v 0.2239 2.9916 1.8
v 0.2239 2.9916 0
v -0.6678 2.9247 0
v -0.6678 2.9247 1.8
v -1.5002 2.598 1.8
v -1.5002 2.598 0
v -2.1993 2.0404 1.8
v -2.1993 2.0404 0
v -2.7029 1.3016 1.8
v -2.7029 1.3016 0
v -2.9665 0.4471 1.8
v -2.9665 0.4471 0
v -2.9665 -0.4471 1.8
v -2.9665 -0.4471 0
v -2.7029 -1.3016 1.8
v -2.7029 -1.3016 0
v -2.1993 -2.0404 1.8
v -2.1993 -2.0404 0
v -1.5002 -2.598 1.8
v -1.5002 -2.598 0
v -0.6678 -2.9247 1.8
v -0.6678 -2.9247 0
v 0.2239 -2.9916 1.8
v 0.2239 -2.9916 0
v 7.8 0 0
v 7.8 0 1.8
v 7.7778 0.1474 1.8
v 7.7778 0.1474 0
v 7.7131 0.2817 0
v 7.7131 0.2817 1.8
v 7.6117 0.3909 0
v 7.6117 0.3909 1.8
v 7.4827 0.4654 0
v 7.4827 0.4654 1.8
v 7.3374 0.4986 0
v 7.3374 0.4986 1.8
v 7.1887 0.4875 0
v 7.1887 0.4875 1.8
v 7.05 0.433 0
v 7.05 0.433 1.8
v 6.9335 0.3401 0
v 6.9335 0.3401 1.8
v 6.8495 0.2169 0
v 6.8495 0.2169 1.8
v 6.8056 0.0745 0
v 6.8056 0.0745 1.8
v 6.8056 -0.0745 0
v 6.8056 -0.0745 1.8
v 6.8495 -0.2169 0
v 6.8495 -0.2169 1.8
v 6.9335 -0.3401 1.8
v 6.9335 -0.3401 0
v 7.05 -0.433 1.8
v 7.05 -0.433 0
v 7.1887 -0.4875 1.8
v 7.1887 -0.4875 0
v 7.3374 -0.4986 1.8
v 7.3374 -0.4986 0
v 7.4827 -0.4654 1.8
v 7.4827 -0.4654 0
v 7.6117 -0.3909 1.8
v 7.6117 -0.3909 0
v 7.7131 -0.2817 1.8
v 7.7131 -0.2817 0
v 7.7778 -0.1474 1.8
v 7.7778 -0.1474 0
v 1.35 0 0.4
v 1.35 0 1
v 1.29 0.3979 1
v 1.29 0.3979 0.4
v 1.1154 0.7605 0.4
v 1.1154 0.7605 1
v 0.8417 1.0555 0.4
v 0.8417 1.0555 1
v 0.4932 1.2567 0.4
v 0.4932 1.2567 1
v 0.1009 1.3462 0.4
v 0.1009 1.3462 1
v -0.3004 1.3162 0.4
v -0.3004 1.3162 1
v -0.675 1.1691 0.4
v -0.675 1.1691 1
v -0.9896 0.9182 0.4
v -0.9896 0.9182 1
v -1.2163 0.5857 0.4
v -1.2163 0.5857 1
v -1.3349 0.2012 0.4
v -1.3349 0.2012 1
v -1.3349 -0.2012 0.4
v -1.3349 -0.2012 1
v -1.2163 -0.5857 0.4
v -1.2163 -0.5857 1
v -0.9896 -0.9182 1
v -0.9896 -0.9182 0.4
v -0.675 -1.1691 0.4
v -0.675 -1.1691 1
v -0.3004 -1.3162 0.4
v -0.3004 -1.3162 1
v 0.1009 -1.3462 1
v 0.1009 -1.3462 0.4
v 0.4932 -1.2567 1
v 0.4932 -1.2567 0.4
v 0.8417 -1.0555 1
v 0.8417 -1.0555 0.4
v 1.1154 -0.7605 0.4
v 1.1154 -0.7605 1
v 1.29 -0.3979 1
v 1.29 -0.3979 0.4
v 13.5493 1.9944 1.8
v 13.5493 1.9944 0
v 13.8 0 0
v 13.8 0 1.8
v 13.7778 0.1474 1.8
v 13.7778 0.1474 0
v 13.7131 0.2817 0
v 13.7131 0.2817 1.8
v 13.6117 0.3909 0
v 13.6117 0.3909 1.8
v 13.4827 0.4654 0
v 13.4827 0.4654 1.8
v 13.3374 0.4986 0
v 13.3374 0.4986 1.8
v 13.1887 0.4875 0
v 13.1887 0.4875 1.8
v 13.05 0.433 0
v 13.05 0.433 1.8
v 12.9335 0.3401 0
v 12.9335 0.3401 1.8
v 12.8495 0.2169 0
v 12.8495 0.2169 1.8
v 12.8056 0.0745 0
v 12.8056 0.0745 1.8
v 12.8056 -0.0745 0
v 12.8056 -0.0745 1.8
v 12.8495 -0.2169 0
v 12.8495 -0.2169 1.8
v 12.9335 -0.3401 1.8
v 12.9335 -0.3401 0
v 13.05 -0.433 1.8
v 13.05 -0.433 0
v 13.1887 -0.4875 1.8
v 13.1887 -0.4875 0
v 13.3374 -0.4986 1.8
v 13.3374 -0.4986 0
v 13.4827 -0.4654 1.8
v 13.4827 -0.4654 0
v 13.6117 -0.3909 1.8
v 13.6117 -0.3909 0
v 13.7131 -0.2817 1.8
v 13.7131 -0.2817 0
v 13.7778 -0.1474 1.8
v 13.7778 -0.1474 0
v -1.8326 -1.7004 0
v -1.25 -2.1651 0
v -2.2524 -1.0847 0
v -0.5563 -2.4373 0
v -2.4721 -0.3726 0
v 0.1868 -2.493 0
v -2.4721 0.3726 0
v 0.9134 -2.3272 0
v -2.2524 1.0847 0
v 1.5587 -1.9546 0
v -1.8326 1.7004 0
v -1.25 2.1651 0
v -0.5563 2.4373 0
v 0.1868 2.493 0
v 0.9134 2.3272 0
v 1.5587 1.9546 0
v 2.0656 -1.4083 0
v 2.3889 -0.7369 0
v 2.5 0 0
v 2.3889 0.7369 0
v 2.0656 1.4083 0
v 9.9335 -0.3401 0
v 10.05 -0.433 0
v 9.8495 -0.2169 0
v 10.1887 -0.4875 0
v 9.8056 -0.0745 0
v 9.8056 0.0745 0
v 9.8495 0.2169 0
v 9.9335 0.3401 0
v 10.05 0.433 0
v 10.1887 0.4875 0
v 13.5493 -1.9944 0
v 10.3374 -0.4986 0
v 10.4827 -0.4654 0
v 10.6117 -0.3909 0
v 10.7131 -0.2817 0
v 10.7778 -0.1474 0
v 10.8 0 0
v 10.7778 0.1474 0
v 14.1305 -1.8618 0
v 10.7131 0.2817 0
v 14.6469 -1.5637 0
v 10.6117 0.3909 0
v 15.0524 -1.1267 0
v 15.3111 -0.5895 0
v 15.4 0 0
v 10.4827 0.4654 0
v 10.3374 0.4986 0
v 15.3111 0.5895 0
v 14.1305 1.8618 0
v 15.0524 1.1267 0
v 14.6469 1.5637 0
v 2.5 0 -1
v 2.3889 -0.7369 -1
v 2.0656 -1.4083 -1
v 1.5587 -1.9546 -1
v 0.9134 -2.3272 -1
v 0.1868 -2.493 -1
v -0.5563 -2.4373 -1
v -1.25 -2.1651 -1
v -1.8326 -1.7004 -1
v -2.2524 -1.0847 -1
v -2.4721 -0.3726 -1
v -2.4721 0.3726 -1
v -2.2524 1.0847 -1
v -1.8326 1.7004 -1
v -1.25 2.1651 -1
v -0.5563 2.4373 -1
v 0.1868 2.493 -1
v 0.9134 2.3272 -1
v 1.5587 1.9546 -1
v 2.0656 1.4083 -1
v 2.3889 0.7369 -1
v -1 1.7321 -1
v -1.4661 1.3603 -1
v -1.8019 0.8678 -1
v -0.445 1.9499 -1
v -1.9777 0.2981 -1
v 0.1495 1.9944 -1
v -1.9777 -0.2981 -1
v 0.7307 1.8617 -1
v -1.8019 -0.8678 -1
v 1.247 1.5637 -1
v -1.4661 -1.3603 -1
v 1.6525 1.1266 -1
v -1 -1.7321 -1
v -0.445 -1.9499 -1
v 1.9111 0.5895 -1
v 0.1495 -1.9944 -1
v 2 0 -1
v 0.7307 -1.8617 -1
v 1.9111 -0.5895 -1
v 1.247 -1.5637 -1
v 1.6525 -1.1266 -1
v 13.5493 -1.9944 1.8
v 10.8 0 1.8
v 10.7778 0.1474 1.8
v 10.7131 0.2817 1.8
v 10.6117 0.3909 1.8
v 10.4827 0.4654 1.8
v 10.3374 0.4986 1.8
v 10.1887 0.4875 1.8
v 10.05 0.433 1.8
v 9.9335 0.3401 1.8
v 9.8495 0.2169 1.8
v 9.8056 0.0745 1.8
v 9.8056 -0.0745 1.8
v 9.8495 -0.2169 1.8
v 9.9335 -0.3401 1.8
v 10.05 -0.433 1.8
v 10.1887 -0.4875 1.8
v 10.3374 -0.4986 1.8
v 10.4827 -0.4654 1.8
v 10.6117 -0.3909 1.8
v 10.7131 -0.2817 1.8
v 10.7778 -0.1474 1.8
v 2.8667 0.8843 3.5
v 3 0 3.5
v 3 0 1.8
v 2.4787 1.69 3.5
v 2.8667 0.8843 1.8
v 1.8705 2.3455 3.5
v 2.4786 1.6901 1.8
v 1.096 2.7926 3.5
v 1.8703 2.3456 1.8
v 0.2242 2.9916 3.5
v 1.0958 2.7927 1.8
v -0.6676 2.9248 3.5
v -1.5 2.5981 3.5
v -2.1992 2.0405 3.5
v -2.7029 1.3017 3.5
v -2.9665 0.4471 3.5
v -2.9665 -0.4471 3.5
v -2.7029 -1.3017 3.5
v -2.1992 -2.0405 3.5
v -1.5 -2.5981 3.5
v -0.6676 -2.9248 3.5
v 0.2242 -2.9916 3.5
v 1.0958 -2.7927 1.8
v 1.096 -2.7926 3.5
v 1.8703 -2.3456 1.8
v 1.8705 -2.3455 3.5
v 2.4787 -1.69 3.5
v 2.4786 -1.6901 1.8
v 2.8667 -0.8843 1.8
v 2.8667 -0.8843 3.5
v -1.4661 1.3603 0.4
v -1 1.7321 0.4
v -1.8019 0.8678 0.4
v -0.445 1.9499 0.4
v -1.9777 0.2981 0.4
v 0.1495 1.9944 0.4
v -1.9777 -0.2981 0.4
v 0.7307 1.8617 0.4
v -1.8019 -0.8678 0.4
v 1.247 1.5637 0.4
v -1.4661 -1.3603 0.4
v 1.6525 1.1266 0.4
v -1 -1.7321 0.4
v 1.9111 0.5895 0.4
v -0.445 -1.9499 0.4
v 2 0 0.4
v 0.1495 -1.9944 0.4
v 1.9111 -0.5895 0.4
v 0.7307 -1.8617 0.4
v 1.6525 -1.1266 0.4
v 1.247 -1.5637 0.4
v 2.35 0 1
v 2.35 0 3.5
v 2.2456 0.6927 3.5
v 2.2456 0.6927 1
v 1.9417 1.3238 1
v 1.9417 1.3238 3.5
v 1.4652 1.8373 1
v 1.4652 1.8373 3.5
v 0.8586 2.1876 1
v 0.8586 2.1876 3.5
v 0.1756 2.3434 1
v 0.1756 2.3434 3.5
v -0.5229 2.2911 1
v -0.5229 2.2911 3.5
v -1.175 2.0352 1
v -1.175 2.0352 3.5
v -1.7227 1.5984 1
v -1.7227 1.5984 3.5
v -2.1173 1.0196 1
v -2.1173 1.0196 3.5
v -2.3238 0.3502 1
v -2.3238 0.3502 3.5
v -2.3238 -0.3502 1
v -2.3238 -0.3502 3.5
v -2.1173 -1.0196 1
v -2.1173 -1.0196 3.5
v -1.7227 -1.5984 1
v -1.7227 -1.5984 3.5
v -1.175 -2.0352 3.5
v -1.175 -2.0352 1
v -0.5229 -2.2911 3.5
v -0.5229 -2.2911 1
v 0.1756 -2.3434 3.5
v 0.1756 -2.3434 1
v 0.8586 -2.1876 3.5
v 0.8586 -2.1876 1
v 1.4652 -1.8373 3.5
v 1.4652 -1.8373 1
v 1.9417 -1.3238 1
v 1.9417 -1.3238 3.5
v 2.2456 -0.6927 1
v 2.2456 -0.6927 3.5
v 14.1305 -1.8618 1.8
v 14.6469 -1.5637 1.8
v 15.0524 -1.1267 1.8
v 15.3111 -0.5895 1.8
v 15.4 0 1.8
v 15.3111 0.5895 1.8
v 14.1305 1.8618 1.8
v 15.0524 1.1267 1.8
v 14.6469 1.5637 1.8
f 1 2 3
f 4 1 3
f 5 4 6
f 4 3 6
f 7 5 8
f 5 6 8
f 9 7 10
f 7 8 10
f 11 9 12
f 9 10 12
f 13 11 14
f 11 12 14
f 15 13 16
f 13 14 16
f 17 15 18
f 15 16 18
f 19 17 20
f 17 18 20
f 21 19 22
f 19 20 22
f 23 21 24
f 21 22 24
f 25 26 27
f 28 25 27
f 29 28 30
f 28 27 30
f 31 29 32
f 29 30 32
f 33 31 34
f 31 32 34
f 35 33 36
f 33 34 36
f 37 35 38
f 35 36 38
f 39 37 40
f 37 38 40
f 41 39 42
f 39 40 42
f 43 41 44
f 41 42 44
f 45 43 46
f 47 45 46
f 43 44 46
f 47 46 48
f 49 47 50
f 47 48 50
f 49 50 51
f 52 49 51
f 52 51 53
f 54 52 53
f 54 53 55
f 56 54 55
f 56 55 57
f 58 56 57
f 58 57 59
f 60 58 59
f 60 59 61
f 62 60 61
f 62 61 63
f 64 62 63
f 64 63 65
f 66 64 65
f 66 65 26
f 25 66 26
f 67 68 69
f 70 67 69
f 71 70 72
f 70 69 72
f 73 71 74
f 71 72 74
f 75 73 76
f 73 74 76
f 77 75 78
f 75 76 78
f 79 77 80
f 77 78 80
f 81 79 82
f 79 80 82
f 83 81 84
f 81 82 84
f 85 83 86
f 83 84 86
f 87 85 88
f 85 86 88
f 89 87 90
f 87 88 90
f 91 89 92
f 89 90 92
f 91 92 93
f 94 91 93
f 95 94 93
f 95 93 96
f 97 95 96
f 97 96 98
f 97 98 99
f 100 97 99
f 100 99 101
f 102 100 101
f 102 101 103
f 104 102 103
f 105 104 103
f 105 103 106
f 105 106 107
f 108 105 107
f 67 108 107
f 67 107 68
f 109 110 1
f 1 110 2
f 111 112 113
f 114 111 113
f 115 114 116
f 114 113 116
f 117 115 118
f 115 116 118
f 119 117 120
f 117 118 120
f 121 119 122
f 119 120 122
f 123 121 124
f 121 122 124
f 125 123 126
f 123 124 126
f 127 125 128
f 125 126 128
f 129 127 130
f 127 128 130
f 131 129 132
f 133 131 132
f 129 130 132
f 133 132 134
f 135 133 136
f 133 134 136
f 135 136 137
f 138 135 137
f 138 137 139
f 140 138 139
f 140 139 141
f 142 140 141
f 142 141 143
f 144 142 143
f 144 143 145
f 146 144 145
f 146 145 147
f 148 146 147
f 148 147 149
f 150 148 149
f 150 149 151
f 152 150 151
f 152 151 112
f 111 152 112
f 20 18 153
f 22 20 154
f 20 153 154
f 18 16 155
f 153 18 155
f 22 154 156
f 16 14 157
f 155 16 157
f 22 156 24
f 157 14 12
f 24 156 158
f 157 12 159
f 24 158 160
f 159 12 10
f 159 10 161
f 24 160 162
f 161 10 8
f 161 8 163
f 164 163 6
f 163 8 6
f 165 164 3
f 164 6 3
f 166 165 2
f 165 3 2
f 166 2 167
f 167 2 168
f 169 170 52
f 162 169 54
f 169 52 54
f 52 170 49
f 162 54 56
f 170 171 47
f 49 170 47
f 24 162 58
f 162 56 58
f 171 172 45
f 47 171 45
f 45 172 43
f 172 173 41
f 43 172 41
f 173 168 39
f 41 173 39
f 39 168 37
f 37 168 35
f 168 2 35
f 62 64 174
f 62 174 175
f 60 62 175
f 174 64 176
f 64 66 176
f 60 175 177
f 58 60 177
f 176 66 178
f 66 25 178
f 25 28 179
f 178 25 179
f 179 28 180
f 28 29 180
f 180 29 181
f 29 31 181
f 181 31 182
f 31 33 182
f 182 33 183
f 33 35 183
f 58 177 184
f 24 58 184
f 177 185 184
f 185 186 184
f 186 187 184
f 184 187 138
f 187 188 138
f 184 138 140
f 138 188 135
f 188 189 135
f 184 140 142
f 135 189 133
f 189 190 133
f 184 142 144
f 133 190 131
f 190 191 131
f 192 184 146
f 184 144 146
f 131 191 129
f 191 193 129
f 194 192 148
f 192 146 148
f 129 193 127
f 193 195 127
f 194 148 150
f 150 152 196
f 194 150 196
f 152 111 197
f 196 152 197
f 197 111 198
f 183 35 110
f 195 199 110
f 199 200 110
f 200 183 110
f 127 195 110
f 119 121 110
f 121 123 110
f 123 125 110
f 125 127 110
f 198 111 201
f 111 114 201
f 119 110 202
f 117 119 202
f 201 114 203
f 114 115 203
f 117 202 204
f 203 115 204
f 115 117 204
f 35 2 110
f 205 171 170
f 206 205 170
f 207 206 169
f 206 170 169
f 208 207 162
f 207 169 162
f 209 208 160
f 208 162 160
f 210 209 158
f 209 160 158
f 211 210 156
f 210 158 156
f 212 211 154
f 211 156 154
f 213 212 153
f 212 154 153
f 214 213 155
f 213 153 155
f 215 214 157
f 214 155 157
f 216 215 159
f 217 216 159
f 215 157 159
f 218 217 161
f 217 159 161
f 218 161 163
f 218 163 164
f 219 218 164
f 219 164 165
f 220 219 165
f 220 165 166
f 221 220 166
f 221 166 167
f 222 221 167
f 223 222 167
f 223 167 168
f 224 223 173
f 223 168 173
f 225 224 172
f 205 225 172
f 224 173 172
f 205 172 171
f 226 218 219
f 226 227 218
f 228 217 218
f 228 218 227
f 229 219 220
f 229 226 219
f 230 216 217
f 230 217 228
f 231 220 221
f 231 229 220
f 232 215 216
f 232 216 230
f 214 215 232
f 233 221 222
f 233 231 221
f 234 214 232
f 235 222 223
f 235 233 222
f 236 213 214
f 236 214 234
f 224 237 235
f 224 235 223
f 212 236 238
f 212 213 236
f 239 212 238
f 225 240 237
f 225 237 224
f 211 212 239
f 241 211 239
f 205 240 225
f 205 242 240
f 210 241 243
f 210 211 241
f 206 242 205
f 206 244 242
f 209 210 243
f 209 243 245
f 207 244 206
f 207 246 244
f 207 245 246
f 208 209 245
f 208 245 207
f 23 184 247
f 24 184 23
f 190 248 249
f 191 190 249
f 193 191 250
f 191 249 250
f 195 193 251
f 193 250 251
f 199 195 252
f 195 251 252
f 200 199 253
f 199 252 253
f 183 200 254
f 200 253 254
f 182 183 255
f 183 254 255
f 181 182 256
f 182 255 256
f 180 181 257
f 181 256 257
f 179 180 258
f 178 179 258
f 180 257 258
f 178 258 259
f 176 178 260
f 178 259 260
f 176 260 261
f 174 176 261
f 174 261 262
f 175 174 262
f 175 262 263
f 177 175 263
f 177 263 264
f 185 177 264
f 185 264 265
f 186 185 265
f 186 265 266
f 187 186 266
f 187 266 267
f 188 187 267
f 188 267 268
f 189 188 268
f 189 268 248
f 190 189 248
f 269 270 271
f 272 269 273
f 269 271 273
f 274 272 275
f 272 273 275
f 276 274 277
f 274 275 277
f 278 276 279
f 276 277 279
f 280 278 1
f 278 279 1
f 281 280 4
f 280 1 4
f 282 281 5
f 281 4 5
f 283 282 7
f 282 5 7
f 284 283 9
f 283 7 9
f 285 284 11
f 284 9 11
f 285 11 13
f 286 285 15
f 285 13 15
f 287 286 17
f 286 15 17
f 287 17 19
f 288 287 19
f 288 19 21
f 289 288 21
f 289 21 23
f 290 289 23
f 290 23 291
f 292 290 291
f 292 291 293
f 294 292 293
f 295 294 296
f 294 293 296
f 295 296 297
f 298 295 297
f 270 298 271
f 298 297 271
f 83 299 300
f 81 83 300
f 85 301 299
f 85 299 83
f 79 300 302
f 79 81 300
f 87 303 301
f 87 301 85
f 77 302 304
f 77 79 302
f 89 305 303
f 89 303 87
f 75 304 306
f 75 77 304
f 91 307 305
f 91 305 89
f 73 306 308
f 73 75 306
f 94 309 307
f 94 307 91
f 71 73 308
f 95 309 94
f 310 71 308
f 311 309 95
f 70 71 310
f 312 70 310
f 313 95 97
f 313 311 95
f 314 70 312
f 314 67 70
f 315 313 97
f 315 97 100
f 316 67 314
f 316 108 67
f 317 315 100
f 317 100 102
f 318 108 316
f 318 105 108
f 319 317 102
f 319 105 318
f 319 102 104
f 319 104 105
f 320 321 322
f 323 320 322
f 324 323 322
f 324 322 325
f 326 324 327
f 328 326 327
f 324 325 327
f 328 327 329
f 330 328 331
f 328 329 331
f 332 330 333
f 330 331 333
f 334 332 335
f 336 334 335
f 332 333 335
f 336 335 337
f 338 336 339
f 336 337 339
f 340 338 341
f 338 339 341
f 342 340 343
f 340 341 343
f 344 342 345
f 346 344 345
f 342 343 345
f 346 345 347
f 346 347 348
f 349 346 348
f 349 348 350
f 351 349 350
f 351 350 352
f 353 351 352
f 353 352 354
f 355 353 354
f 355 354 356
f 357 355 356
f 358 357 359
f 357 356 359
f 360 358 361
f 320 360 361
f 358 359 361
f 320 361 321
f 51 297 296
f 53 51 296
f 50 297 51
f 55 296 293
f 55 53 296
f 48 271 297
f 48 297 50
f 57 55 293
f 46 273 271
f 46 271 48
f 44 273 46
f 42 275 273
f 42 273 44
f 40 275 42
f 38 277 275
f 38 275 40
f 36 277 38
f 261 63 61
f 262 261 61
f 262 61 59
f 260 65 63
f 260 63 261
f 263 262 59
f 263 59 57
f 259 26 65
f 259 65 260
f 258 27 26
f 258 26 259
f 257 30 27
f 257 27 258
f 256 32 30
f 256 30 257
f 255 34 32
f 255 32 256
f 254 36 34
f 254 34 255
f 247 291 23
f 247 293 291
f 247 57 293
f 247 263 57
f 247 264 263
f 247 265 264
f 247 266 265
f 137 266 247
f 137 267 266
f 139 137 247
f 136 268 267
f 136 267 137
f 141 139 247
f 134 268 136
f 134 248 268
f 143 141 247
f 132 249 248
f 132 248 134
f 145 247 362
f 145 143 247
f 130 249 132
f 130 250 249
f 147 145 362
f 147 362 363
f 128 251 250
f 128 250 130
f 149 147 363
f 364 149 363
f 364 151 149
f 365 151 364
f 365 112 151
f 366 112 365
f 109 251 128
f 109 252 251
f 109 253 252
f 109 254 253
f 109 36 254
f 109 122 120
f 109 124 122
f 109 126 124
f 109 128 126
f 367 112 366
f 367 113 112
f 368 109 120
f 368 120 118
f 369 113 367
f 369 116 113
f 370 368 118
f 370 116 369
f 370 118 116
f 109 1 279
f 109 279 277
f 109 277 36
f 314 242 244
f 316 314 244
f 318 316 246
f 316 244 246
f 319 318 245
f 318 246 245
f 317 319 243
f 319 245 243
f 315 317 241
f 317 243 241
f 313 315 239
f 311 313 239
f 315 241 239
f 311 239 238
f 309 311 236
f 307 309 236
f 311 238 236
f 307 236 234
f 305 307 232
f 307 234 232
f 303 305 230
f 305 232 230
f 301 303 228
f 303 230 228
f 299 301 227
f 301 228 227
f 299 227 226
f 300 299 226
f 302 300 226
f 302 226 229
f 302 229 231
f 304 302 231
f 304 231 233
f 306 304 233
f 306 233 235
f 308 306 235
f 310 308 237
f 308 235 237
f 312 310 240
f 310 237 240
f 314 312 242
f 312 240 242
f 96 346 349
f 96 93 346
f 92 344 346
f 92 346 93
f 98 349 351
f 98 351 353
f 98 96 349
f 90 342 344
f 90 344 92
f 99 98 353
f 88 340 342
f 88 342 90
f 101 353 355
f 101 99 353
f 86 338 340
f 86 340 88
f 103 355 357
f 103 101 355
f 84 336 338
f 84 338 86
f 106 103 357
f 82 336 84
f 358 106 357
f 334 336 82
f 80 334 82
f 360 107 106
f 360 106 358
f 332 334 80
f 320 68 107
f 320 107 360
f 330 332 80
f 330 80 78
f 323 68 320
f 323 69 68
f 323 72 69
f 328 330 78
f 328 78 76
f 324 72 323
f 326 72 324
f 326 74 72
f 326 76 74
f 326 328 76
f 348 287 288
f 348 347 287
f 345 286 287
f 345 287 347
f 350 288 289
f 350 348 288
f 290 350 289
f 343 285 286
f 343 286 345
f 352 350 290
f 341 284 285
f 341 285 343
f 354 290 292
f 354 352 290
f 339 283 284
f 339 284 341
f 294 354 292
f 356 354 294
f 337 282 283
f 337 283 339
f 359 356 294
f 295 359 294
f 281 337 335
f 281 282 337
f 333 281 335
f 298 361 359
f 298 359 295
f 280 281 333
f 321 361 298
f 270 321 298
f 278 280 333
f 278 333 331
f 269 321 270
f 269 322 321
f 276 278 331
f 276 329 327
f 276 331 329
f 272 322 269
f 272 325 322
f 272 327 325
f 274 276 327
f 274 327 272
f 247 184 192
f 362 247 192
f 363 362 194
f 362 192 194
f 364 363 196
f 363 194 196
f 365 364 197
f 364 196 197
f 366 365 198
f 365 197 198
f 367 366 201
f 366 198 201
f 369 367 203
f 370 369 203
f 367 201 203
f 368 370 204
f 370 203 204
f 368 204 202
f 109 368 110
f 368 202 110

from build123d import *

# Parameters (mm, degrees)
PAD_DEPTH       = 1.8
SKETCH001_R     = 3
PAD001_DEPTH    = 1.7
SKETCH002_R     = 2.5
PAD002_DEPTH    = 1
SKETCH003_R     = 2
POCKET_DEPTH    = 1.4
SKETCH004_R     = 2.35
POCKET001_DEPTH = 2.5
SKETCH005_R     = 1.35
POCKET002_DEPTH = 4.501
SKETCH006_R     = 0.5
POCKET003_DEPTH = 2.801


with BuildPart() as part:
    # Sketch → Pad (new body)
    with BuildSketch(Plane.XY):
        with BuildLine():
            ThreePointArc((0.2238838654, 2.9916343384), (-3, -2.741e-07), (0.223884412, -2.9916342975))
            Line((13.5492701682, -1.9944218252), (0.223884412, -2.9916342975))
            ThreePointArc((13.5492701681, -1.9944218252), (15.4, 0), (13.5492701681, 1.9944218252))
            Line((13.5492701682, 1.9944218252), (0.2238838654, 2.9916343384))
        make_face()
    extrude(amount=PAD_DEPTH)

    # Sketch001 → Pad001 (new body)
    with BuildSketch(Plane.XY.offset(1.8)):
        Circle(SKETCH001_R)
    extrude(amount=PAD001_DEPTH)

    # Sketch002 → Pad002 (new body)
    with BuildSketch(Plane(origin=(0, 0, 0), x_dir=(1, 0, 0), z_dir=(0, 0, -1))):
        Circle(SKETCH002_R)
    extrude(amount=PAD002_DEPTH)

    # Sketch003 → Pocket (cut)
    with BuildSketch(Plane(origin=(0, 0, -1), x_dir=(1, 0, 0), z_dir=(0, 0, -1))):
        Circle(SKETCH003_R)
    extrude(amount=-POCKET_DEPTH, mode=Mode.SUBTRACT)

    # Sketch004 → Pocket001 (cut)
    with BuildSketch(Plane.XY.offset(3.5)):
        Circle(SKETCH004_R)
    extrude(amount=-POCKET001_DEPTH, mode=Mode.SUBTRACT)

    # Sketch005 → Pocket002 (cut, through all)
    with BuildSketch(Plane.XY.offset(3.5)):
        Circle(SKETCH005_R)
    extrude(amount=-POCKET002_DEPTH, mode=Mode.SUBTRACT)

    # Sketch006 → Pocket003 (cut, through all)
    with BuildSketch(Plane.XY.offset(1.8)):
        with Locations((7.3, 0)):
            Circle(SKETCH006_R)
        with Locations((10.3, 0)):
            Circle(SKETCH006_R)
        with Locations((13.3, 0)):
            Circle(SKETCH006_R)
    extrude(amount=-POCKET003_DEPTH, mode=Mode.SUBTRACT)


solid = part.part
